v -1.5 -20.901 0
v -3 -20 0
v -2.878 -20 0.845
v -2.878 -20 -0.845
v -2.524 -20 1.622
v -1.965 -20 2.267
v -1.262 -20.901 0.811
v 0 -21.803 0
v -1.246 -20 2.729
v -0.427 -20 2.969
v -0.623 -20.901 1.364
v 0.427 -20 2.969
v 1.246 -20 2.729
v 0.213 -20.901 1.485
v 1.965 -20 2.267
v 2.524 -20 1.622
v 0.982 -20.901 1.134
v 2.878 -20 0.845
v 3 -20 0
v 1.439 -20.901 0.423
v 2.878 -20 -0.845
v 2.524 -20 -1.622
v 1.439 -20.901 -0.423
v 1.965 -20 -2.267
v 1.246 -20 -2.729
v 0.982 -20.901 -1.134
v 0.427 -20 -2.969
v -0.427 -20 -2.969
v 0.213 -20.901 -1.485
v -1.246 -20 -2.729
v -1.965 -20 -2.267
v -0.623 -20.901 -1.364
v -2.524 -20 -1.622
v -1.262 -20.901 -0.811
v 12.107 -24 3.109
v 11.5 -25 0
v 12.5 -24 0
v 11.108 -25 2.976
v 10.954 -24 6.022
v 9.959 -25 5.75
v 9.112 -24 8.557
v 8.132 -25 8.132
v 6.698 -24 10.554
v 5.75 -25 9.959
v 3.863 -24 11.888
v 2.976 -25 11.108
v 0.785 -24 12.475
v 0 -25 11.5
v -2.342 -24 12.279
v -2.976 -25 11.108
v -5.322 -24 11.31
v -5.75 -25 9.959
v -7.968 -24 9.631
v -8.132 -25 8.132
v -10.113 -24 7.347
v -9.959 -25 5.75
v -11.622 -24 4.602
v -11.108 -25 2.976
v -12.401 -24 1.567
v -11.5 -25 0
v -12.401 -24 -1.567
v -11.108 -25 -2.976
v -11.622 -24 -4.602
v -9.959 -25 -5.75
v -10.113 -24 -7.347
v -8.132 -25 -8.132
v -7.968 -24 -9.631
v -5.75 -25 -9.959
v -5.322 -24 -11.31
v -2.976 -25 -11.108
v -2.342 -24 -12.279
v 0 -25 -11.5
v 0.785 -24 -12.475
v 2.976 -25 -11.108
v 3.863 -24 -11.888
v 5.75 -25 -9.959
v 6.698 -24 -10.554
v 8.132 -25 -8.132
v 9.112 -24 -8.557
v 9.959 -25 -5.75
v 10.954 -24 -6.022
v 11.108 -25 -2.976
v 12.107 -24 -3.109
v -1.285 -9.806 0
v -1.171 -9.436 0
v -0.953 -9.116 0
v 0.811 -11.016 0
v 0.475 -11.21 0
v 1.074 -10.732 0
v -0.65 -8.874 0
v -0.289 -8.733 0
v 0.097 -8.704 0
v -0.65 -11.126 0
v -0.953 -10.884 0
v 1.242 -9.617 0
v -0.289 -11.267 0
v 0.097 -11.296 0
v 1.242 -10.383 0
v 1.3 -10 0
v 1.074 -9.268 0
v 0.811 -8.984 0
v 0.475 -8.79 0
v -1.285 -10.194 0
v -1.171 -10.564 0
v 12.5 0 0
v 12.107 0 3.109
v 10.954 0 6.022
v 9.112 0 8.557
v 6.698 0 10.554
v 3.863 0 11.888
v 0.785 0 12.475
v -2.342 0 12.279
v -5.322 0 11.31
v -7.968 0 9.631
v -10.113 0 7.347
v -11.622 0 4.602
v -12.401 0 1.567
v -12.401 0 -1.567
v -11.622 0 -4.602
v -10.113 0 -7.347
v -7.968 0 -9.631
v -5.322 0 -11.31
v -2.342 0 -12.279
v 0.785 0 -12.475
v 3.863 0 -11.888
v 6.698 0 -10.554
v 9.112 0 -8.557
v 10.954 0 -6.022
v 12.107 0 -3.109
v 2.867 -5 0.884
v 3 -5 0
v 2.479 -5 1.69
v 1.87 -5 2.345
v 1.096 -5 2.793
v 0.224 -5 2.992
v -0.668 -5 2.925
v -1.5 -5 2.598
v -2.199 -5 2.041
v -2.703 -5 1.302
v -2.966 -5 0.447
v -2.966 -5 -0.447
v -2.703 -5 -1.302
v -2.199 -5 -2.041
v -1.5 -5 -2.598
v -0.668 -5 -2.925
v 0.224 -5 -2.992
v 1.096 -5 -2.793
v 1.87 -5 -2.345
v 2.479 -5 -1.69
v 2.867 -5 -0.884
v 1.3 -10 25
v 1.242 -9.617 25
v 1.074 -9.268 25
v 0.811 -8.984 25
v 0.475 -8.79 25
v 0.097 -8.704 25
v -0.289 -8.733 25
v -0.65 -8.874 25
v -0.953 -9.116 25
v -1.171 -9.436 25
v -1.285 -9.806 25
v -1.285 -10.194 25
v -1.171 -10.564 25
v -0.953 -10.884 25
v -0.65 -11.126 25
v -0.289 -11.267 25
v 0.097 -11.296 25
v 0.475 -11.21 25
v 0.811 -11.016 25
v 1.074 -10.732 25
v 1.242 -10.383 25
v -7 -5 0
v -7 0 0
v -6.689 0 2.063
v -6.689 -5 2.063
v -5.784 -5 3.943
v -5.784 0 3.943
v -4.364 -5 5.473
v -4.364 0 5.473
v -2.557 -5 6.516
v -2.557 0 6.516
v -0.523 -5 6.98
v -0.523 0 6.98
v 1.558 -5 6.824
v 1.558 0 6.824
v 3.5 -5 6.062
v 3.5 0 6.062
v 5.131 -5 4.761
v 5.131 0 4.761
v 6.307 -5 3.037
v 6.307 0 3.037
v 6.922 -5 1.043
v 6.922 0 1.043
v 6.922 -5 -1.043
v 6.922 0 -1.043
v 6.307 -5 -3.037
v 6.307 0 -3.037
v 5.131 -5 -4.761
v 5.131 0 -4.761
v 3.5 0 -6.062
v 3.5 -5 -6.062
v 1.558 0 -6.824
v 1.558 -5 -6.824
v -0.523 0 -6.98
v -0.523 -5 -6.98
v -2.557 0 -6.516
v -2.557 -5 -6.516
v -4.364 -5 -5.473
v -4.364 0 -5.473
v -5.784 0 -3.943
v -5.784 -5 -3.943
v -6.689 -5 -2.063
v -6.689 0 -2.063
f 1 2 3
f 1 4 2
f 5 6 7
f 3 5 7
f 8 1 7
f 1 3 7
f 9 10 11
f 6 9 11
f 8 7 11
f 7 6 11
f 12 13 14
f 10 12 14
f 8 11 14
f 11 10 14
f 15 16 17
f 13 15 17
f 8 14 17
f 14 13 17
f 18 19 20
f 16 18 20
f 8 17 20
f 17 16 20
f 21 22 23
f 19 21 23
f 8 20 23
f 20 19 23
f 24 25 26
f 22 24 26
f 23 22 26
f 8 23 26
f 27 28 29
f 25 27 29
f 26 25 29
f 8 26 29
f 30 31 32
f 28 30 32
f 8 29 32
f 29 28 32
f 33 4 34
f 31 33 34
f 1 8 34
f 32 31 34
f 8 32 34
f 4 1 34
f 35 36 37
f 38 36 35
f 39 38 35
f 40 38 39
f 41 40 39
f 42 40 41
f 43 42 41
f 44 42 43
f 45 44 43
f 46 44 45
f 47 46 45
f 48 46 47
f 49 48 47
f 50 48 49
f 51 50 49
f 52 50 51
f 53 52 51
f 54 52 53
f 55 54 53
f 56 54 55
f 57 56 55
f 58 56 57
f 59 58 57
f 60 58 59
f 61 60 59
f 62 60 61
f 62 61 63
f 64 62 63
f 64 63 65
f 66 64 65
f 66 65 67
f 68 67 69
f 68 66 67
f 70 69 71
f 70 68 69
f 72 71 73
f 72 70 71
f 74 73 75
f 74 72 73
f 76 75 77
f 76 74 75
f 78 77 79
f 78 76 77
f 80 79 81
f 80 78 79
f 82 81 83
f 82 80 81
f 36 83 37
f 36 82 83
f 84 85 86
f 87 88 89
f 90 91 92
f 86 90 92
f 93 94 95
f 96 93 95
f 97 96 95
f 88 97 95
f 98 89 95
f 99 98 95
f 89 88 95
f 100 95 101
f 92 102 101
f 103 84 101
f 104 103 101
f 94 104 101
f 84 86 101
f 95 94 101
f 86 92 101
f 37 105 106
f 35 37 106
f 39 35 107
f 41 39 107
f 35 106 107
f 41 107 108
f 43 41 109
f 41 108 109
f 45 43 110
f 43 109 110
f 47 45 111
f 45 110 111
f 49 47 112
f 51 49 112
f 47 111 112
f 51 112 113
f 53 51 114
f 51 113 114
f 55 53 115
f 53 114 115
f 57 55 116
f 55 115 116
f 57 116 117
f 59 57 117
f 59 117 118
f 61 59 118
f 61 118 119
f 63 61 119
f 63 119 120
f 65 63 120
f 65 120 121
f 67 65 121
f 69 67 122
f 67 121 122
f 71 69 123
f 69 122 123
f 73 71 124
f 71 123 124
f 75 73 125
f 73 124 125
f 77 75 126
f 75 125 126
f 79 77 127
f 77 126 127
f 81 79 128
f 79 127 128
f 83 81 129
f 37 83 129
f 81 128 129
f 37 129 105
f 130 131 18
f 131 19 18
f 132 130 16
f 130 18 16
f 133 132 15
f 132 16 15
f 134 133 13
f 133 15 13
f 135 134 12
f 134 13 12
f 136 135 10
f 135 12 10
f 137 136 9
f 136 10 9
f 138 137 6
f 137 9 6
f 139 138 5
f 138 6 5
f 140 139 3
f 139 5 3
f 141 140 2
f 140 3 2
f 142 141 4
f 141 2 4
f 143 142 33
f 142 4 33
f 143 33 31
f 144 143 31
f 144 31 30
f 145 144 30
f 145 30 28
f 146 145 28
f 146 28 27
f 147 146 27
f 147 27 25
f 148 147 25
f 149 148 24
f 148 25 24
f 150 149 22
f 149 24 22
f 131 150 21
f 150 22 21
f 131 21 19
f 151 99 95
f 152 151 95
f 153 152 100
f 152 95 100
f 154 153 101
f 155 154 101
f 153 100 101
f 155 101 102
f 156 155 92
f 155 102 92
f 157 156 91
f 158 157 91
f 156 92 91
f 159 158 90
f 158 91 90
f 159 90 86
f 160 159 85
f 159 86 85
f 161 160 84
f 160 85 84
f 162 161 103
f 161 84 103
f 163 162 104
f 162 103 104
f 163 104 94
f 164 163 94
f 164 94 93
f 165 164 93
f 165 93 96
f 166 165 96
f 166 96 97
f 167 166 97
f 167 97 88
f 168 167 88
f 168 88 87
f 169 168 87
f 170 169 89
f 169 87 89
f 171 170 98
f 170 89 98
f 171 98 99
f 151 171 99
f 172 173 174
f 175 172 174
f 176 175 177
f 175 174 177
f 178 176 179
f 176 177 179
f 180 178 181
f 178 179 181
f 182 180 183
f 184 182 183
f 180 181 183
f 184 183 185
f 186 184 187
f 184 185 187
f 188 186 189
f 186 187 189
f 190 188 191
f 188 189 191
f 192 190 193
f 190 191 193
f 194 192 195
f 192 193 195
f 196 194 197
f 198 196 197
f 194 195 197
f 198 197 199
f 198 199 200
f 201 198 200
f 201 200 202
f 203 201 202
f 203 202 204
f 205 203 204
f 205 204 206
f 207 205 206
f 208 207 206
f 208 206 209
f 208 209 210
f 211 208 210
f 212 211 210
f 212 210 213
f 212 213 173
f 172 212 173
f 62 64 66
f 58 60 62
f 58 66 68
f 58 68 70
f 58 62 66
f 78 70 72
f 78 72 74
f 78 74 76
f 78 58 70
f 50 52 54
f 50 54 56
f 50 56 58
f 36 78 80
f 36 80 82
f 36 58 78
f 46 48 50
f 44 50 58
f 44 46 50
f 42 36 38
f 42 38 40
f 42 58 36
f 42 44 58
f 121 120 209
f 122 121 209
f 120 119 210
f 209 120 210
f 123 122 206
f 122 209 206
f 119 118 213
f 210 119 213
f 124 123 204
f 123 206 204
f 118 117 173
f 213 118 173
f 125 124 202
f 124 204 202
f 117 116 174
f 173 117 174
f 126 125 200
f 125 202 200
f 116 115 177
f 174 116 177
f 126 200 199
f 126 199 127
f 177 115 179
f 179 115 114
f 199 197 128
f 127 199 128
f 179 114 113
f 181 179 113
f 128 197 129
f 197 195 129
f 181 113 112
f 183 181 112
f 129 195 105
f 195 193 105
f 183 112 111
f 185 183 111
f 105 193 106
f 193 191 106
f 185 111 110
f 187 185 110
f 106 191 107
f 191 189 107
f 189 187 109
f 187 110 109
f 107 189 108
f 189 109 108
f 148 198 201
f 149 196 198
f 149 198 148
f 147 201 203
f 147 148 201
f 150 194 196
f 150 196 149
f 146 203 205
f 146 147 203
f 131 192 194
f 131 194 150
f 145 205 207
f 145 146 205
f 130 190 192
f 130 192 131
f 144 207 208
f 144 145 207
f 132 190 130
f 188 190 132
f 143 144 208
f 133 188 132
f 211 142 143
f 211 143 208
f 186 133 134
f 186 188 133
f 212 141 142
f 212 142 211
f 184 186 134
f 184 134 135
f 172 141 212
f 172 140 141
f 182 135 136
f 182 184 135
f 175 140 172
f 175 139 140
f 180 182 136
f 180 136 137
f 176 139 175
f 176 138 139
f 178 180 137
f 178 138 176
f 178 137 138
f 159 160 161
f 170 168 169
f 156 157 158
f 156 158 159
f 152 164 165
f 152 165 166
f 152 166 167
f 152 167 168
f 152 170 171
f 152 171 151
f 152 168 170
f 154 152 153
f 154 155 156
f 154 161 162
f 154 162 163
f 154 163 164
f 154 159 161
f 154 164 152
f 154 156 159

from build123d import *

# Parameters (mm, degrees)
F0_R           = 12.5
F1_DEPTH       = 25
F2_SIZE        = 1
F4_D           = 6
F4_DEPTH       = 20
F4_CBORE_D     = 14
F4_CBORE_DEPTH = 5
F4_TIP         = 1.8025818571
F5_R           = 1.3
F6_DEPTH       = 25


with BuildPart() as f1:
    # F0 (on Front) → F1 (new body)
    with BuildSketch(Plane.XZ):
        Circle(F0_R)
    extrude(amount=F1_DEPTH)

    # F2
    f2_edges = [f1.edges().sort_by_distance(p)[0] for p in [
        (-12.5, -25, 0),
    ]]
    chamfer(f2_edges, length=F2_SIZE)

    # F4
    with Locations(Plane(origin=(0, 0, 0), x_dir=(-1, 0, 0), z_dir=(0, 1, 0))):
        with Locations((0, 0)):
            CounterBoreHole(F4_D / 2, F4_CBORE_D / 2, F4_CBORE_DEPTH, depth=F4_DEPTH)
            with Locations((0, 0, -(F4_DEPTH + F4_TIP / 2))):  # 118° drill point
                Cone(0, F4_D / 2, F4_TIP, mode=Mode.SUBTRACT)


with BuildPart() as f6:
    # F5 (on Top) → F6 (new body)
    with BuildSketch(Plane.XY):
        with Locations((0, -10)):
            Circle(F5_R)
    extrude(amount=F6_DEPTH)


solid = Compound([f1.part, f6.part])
